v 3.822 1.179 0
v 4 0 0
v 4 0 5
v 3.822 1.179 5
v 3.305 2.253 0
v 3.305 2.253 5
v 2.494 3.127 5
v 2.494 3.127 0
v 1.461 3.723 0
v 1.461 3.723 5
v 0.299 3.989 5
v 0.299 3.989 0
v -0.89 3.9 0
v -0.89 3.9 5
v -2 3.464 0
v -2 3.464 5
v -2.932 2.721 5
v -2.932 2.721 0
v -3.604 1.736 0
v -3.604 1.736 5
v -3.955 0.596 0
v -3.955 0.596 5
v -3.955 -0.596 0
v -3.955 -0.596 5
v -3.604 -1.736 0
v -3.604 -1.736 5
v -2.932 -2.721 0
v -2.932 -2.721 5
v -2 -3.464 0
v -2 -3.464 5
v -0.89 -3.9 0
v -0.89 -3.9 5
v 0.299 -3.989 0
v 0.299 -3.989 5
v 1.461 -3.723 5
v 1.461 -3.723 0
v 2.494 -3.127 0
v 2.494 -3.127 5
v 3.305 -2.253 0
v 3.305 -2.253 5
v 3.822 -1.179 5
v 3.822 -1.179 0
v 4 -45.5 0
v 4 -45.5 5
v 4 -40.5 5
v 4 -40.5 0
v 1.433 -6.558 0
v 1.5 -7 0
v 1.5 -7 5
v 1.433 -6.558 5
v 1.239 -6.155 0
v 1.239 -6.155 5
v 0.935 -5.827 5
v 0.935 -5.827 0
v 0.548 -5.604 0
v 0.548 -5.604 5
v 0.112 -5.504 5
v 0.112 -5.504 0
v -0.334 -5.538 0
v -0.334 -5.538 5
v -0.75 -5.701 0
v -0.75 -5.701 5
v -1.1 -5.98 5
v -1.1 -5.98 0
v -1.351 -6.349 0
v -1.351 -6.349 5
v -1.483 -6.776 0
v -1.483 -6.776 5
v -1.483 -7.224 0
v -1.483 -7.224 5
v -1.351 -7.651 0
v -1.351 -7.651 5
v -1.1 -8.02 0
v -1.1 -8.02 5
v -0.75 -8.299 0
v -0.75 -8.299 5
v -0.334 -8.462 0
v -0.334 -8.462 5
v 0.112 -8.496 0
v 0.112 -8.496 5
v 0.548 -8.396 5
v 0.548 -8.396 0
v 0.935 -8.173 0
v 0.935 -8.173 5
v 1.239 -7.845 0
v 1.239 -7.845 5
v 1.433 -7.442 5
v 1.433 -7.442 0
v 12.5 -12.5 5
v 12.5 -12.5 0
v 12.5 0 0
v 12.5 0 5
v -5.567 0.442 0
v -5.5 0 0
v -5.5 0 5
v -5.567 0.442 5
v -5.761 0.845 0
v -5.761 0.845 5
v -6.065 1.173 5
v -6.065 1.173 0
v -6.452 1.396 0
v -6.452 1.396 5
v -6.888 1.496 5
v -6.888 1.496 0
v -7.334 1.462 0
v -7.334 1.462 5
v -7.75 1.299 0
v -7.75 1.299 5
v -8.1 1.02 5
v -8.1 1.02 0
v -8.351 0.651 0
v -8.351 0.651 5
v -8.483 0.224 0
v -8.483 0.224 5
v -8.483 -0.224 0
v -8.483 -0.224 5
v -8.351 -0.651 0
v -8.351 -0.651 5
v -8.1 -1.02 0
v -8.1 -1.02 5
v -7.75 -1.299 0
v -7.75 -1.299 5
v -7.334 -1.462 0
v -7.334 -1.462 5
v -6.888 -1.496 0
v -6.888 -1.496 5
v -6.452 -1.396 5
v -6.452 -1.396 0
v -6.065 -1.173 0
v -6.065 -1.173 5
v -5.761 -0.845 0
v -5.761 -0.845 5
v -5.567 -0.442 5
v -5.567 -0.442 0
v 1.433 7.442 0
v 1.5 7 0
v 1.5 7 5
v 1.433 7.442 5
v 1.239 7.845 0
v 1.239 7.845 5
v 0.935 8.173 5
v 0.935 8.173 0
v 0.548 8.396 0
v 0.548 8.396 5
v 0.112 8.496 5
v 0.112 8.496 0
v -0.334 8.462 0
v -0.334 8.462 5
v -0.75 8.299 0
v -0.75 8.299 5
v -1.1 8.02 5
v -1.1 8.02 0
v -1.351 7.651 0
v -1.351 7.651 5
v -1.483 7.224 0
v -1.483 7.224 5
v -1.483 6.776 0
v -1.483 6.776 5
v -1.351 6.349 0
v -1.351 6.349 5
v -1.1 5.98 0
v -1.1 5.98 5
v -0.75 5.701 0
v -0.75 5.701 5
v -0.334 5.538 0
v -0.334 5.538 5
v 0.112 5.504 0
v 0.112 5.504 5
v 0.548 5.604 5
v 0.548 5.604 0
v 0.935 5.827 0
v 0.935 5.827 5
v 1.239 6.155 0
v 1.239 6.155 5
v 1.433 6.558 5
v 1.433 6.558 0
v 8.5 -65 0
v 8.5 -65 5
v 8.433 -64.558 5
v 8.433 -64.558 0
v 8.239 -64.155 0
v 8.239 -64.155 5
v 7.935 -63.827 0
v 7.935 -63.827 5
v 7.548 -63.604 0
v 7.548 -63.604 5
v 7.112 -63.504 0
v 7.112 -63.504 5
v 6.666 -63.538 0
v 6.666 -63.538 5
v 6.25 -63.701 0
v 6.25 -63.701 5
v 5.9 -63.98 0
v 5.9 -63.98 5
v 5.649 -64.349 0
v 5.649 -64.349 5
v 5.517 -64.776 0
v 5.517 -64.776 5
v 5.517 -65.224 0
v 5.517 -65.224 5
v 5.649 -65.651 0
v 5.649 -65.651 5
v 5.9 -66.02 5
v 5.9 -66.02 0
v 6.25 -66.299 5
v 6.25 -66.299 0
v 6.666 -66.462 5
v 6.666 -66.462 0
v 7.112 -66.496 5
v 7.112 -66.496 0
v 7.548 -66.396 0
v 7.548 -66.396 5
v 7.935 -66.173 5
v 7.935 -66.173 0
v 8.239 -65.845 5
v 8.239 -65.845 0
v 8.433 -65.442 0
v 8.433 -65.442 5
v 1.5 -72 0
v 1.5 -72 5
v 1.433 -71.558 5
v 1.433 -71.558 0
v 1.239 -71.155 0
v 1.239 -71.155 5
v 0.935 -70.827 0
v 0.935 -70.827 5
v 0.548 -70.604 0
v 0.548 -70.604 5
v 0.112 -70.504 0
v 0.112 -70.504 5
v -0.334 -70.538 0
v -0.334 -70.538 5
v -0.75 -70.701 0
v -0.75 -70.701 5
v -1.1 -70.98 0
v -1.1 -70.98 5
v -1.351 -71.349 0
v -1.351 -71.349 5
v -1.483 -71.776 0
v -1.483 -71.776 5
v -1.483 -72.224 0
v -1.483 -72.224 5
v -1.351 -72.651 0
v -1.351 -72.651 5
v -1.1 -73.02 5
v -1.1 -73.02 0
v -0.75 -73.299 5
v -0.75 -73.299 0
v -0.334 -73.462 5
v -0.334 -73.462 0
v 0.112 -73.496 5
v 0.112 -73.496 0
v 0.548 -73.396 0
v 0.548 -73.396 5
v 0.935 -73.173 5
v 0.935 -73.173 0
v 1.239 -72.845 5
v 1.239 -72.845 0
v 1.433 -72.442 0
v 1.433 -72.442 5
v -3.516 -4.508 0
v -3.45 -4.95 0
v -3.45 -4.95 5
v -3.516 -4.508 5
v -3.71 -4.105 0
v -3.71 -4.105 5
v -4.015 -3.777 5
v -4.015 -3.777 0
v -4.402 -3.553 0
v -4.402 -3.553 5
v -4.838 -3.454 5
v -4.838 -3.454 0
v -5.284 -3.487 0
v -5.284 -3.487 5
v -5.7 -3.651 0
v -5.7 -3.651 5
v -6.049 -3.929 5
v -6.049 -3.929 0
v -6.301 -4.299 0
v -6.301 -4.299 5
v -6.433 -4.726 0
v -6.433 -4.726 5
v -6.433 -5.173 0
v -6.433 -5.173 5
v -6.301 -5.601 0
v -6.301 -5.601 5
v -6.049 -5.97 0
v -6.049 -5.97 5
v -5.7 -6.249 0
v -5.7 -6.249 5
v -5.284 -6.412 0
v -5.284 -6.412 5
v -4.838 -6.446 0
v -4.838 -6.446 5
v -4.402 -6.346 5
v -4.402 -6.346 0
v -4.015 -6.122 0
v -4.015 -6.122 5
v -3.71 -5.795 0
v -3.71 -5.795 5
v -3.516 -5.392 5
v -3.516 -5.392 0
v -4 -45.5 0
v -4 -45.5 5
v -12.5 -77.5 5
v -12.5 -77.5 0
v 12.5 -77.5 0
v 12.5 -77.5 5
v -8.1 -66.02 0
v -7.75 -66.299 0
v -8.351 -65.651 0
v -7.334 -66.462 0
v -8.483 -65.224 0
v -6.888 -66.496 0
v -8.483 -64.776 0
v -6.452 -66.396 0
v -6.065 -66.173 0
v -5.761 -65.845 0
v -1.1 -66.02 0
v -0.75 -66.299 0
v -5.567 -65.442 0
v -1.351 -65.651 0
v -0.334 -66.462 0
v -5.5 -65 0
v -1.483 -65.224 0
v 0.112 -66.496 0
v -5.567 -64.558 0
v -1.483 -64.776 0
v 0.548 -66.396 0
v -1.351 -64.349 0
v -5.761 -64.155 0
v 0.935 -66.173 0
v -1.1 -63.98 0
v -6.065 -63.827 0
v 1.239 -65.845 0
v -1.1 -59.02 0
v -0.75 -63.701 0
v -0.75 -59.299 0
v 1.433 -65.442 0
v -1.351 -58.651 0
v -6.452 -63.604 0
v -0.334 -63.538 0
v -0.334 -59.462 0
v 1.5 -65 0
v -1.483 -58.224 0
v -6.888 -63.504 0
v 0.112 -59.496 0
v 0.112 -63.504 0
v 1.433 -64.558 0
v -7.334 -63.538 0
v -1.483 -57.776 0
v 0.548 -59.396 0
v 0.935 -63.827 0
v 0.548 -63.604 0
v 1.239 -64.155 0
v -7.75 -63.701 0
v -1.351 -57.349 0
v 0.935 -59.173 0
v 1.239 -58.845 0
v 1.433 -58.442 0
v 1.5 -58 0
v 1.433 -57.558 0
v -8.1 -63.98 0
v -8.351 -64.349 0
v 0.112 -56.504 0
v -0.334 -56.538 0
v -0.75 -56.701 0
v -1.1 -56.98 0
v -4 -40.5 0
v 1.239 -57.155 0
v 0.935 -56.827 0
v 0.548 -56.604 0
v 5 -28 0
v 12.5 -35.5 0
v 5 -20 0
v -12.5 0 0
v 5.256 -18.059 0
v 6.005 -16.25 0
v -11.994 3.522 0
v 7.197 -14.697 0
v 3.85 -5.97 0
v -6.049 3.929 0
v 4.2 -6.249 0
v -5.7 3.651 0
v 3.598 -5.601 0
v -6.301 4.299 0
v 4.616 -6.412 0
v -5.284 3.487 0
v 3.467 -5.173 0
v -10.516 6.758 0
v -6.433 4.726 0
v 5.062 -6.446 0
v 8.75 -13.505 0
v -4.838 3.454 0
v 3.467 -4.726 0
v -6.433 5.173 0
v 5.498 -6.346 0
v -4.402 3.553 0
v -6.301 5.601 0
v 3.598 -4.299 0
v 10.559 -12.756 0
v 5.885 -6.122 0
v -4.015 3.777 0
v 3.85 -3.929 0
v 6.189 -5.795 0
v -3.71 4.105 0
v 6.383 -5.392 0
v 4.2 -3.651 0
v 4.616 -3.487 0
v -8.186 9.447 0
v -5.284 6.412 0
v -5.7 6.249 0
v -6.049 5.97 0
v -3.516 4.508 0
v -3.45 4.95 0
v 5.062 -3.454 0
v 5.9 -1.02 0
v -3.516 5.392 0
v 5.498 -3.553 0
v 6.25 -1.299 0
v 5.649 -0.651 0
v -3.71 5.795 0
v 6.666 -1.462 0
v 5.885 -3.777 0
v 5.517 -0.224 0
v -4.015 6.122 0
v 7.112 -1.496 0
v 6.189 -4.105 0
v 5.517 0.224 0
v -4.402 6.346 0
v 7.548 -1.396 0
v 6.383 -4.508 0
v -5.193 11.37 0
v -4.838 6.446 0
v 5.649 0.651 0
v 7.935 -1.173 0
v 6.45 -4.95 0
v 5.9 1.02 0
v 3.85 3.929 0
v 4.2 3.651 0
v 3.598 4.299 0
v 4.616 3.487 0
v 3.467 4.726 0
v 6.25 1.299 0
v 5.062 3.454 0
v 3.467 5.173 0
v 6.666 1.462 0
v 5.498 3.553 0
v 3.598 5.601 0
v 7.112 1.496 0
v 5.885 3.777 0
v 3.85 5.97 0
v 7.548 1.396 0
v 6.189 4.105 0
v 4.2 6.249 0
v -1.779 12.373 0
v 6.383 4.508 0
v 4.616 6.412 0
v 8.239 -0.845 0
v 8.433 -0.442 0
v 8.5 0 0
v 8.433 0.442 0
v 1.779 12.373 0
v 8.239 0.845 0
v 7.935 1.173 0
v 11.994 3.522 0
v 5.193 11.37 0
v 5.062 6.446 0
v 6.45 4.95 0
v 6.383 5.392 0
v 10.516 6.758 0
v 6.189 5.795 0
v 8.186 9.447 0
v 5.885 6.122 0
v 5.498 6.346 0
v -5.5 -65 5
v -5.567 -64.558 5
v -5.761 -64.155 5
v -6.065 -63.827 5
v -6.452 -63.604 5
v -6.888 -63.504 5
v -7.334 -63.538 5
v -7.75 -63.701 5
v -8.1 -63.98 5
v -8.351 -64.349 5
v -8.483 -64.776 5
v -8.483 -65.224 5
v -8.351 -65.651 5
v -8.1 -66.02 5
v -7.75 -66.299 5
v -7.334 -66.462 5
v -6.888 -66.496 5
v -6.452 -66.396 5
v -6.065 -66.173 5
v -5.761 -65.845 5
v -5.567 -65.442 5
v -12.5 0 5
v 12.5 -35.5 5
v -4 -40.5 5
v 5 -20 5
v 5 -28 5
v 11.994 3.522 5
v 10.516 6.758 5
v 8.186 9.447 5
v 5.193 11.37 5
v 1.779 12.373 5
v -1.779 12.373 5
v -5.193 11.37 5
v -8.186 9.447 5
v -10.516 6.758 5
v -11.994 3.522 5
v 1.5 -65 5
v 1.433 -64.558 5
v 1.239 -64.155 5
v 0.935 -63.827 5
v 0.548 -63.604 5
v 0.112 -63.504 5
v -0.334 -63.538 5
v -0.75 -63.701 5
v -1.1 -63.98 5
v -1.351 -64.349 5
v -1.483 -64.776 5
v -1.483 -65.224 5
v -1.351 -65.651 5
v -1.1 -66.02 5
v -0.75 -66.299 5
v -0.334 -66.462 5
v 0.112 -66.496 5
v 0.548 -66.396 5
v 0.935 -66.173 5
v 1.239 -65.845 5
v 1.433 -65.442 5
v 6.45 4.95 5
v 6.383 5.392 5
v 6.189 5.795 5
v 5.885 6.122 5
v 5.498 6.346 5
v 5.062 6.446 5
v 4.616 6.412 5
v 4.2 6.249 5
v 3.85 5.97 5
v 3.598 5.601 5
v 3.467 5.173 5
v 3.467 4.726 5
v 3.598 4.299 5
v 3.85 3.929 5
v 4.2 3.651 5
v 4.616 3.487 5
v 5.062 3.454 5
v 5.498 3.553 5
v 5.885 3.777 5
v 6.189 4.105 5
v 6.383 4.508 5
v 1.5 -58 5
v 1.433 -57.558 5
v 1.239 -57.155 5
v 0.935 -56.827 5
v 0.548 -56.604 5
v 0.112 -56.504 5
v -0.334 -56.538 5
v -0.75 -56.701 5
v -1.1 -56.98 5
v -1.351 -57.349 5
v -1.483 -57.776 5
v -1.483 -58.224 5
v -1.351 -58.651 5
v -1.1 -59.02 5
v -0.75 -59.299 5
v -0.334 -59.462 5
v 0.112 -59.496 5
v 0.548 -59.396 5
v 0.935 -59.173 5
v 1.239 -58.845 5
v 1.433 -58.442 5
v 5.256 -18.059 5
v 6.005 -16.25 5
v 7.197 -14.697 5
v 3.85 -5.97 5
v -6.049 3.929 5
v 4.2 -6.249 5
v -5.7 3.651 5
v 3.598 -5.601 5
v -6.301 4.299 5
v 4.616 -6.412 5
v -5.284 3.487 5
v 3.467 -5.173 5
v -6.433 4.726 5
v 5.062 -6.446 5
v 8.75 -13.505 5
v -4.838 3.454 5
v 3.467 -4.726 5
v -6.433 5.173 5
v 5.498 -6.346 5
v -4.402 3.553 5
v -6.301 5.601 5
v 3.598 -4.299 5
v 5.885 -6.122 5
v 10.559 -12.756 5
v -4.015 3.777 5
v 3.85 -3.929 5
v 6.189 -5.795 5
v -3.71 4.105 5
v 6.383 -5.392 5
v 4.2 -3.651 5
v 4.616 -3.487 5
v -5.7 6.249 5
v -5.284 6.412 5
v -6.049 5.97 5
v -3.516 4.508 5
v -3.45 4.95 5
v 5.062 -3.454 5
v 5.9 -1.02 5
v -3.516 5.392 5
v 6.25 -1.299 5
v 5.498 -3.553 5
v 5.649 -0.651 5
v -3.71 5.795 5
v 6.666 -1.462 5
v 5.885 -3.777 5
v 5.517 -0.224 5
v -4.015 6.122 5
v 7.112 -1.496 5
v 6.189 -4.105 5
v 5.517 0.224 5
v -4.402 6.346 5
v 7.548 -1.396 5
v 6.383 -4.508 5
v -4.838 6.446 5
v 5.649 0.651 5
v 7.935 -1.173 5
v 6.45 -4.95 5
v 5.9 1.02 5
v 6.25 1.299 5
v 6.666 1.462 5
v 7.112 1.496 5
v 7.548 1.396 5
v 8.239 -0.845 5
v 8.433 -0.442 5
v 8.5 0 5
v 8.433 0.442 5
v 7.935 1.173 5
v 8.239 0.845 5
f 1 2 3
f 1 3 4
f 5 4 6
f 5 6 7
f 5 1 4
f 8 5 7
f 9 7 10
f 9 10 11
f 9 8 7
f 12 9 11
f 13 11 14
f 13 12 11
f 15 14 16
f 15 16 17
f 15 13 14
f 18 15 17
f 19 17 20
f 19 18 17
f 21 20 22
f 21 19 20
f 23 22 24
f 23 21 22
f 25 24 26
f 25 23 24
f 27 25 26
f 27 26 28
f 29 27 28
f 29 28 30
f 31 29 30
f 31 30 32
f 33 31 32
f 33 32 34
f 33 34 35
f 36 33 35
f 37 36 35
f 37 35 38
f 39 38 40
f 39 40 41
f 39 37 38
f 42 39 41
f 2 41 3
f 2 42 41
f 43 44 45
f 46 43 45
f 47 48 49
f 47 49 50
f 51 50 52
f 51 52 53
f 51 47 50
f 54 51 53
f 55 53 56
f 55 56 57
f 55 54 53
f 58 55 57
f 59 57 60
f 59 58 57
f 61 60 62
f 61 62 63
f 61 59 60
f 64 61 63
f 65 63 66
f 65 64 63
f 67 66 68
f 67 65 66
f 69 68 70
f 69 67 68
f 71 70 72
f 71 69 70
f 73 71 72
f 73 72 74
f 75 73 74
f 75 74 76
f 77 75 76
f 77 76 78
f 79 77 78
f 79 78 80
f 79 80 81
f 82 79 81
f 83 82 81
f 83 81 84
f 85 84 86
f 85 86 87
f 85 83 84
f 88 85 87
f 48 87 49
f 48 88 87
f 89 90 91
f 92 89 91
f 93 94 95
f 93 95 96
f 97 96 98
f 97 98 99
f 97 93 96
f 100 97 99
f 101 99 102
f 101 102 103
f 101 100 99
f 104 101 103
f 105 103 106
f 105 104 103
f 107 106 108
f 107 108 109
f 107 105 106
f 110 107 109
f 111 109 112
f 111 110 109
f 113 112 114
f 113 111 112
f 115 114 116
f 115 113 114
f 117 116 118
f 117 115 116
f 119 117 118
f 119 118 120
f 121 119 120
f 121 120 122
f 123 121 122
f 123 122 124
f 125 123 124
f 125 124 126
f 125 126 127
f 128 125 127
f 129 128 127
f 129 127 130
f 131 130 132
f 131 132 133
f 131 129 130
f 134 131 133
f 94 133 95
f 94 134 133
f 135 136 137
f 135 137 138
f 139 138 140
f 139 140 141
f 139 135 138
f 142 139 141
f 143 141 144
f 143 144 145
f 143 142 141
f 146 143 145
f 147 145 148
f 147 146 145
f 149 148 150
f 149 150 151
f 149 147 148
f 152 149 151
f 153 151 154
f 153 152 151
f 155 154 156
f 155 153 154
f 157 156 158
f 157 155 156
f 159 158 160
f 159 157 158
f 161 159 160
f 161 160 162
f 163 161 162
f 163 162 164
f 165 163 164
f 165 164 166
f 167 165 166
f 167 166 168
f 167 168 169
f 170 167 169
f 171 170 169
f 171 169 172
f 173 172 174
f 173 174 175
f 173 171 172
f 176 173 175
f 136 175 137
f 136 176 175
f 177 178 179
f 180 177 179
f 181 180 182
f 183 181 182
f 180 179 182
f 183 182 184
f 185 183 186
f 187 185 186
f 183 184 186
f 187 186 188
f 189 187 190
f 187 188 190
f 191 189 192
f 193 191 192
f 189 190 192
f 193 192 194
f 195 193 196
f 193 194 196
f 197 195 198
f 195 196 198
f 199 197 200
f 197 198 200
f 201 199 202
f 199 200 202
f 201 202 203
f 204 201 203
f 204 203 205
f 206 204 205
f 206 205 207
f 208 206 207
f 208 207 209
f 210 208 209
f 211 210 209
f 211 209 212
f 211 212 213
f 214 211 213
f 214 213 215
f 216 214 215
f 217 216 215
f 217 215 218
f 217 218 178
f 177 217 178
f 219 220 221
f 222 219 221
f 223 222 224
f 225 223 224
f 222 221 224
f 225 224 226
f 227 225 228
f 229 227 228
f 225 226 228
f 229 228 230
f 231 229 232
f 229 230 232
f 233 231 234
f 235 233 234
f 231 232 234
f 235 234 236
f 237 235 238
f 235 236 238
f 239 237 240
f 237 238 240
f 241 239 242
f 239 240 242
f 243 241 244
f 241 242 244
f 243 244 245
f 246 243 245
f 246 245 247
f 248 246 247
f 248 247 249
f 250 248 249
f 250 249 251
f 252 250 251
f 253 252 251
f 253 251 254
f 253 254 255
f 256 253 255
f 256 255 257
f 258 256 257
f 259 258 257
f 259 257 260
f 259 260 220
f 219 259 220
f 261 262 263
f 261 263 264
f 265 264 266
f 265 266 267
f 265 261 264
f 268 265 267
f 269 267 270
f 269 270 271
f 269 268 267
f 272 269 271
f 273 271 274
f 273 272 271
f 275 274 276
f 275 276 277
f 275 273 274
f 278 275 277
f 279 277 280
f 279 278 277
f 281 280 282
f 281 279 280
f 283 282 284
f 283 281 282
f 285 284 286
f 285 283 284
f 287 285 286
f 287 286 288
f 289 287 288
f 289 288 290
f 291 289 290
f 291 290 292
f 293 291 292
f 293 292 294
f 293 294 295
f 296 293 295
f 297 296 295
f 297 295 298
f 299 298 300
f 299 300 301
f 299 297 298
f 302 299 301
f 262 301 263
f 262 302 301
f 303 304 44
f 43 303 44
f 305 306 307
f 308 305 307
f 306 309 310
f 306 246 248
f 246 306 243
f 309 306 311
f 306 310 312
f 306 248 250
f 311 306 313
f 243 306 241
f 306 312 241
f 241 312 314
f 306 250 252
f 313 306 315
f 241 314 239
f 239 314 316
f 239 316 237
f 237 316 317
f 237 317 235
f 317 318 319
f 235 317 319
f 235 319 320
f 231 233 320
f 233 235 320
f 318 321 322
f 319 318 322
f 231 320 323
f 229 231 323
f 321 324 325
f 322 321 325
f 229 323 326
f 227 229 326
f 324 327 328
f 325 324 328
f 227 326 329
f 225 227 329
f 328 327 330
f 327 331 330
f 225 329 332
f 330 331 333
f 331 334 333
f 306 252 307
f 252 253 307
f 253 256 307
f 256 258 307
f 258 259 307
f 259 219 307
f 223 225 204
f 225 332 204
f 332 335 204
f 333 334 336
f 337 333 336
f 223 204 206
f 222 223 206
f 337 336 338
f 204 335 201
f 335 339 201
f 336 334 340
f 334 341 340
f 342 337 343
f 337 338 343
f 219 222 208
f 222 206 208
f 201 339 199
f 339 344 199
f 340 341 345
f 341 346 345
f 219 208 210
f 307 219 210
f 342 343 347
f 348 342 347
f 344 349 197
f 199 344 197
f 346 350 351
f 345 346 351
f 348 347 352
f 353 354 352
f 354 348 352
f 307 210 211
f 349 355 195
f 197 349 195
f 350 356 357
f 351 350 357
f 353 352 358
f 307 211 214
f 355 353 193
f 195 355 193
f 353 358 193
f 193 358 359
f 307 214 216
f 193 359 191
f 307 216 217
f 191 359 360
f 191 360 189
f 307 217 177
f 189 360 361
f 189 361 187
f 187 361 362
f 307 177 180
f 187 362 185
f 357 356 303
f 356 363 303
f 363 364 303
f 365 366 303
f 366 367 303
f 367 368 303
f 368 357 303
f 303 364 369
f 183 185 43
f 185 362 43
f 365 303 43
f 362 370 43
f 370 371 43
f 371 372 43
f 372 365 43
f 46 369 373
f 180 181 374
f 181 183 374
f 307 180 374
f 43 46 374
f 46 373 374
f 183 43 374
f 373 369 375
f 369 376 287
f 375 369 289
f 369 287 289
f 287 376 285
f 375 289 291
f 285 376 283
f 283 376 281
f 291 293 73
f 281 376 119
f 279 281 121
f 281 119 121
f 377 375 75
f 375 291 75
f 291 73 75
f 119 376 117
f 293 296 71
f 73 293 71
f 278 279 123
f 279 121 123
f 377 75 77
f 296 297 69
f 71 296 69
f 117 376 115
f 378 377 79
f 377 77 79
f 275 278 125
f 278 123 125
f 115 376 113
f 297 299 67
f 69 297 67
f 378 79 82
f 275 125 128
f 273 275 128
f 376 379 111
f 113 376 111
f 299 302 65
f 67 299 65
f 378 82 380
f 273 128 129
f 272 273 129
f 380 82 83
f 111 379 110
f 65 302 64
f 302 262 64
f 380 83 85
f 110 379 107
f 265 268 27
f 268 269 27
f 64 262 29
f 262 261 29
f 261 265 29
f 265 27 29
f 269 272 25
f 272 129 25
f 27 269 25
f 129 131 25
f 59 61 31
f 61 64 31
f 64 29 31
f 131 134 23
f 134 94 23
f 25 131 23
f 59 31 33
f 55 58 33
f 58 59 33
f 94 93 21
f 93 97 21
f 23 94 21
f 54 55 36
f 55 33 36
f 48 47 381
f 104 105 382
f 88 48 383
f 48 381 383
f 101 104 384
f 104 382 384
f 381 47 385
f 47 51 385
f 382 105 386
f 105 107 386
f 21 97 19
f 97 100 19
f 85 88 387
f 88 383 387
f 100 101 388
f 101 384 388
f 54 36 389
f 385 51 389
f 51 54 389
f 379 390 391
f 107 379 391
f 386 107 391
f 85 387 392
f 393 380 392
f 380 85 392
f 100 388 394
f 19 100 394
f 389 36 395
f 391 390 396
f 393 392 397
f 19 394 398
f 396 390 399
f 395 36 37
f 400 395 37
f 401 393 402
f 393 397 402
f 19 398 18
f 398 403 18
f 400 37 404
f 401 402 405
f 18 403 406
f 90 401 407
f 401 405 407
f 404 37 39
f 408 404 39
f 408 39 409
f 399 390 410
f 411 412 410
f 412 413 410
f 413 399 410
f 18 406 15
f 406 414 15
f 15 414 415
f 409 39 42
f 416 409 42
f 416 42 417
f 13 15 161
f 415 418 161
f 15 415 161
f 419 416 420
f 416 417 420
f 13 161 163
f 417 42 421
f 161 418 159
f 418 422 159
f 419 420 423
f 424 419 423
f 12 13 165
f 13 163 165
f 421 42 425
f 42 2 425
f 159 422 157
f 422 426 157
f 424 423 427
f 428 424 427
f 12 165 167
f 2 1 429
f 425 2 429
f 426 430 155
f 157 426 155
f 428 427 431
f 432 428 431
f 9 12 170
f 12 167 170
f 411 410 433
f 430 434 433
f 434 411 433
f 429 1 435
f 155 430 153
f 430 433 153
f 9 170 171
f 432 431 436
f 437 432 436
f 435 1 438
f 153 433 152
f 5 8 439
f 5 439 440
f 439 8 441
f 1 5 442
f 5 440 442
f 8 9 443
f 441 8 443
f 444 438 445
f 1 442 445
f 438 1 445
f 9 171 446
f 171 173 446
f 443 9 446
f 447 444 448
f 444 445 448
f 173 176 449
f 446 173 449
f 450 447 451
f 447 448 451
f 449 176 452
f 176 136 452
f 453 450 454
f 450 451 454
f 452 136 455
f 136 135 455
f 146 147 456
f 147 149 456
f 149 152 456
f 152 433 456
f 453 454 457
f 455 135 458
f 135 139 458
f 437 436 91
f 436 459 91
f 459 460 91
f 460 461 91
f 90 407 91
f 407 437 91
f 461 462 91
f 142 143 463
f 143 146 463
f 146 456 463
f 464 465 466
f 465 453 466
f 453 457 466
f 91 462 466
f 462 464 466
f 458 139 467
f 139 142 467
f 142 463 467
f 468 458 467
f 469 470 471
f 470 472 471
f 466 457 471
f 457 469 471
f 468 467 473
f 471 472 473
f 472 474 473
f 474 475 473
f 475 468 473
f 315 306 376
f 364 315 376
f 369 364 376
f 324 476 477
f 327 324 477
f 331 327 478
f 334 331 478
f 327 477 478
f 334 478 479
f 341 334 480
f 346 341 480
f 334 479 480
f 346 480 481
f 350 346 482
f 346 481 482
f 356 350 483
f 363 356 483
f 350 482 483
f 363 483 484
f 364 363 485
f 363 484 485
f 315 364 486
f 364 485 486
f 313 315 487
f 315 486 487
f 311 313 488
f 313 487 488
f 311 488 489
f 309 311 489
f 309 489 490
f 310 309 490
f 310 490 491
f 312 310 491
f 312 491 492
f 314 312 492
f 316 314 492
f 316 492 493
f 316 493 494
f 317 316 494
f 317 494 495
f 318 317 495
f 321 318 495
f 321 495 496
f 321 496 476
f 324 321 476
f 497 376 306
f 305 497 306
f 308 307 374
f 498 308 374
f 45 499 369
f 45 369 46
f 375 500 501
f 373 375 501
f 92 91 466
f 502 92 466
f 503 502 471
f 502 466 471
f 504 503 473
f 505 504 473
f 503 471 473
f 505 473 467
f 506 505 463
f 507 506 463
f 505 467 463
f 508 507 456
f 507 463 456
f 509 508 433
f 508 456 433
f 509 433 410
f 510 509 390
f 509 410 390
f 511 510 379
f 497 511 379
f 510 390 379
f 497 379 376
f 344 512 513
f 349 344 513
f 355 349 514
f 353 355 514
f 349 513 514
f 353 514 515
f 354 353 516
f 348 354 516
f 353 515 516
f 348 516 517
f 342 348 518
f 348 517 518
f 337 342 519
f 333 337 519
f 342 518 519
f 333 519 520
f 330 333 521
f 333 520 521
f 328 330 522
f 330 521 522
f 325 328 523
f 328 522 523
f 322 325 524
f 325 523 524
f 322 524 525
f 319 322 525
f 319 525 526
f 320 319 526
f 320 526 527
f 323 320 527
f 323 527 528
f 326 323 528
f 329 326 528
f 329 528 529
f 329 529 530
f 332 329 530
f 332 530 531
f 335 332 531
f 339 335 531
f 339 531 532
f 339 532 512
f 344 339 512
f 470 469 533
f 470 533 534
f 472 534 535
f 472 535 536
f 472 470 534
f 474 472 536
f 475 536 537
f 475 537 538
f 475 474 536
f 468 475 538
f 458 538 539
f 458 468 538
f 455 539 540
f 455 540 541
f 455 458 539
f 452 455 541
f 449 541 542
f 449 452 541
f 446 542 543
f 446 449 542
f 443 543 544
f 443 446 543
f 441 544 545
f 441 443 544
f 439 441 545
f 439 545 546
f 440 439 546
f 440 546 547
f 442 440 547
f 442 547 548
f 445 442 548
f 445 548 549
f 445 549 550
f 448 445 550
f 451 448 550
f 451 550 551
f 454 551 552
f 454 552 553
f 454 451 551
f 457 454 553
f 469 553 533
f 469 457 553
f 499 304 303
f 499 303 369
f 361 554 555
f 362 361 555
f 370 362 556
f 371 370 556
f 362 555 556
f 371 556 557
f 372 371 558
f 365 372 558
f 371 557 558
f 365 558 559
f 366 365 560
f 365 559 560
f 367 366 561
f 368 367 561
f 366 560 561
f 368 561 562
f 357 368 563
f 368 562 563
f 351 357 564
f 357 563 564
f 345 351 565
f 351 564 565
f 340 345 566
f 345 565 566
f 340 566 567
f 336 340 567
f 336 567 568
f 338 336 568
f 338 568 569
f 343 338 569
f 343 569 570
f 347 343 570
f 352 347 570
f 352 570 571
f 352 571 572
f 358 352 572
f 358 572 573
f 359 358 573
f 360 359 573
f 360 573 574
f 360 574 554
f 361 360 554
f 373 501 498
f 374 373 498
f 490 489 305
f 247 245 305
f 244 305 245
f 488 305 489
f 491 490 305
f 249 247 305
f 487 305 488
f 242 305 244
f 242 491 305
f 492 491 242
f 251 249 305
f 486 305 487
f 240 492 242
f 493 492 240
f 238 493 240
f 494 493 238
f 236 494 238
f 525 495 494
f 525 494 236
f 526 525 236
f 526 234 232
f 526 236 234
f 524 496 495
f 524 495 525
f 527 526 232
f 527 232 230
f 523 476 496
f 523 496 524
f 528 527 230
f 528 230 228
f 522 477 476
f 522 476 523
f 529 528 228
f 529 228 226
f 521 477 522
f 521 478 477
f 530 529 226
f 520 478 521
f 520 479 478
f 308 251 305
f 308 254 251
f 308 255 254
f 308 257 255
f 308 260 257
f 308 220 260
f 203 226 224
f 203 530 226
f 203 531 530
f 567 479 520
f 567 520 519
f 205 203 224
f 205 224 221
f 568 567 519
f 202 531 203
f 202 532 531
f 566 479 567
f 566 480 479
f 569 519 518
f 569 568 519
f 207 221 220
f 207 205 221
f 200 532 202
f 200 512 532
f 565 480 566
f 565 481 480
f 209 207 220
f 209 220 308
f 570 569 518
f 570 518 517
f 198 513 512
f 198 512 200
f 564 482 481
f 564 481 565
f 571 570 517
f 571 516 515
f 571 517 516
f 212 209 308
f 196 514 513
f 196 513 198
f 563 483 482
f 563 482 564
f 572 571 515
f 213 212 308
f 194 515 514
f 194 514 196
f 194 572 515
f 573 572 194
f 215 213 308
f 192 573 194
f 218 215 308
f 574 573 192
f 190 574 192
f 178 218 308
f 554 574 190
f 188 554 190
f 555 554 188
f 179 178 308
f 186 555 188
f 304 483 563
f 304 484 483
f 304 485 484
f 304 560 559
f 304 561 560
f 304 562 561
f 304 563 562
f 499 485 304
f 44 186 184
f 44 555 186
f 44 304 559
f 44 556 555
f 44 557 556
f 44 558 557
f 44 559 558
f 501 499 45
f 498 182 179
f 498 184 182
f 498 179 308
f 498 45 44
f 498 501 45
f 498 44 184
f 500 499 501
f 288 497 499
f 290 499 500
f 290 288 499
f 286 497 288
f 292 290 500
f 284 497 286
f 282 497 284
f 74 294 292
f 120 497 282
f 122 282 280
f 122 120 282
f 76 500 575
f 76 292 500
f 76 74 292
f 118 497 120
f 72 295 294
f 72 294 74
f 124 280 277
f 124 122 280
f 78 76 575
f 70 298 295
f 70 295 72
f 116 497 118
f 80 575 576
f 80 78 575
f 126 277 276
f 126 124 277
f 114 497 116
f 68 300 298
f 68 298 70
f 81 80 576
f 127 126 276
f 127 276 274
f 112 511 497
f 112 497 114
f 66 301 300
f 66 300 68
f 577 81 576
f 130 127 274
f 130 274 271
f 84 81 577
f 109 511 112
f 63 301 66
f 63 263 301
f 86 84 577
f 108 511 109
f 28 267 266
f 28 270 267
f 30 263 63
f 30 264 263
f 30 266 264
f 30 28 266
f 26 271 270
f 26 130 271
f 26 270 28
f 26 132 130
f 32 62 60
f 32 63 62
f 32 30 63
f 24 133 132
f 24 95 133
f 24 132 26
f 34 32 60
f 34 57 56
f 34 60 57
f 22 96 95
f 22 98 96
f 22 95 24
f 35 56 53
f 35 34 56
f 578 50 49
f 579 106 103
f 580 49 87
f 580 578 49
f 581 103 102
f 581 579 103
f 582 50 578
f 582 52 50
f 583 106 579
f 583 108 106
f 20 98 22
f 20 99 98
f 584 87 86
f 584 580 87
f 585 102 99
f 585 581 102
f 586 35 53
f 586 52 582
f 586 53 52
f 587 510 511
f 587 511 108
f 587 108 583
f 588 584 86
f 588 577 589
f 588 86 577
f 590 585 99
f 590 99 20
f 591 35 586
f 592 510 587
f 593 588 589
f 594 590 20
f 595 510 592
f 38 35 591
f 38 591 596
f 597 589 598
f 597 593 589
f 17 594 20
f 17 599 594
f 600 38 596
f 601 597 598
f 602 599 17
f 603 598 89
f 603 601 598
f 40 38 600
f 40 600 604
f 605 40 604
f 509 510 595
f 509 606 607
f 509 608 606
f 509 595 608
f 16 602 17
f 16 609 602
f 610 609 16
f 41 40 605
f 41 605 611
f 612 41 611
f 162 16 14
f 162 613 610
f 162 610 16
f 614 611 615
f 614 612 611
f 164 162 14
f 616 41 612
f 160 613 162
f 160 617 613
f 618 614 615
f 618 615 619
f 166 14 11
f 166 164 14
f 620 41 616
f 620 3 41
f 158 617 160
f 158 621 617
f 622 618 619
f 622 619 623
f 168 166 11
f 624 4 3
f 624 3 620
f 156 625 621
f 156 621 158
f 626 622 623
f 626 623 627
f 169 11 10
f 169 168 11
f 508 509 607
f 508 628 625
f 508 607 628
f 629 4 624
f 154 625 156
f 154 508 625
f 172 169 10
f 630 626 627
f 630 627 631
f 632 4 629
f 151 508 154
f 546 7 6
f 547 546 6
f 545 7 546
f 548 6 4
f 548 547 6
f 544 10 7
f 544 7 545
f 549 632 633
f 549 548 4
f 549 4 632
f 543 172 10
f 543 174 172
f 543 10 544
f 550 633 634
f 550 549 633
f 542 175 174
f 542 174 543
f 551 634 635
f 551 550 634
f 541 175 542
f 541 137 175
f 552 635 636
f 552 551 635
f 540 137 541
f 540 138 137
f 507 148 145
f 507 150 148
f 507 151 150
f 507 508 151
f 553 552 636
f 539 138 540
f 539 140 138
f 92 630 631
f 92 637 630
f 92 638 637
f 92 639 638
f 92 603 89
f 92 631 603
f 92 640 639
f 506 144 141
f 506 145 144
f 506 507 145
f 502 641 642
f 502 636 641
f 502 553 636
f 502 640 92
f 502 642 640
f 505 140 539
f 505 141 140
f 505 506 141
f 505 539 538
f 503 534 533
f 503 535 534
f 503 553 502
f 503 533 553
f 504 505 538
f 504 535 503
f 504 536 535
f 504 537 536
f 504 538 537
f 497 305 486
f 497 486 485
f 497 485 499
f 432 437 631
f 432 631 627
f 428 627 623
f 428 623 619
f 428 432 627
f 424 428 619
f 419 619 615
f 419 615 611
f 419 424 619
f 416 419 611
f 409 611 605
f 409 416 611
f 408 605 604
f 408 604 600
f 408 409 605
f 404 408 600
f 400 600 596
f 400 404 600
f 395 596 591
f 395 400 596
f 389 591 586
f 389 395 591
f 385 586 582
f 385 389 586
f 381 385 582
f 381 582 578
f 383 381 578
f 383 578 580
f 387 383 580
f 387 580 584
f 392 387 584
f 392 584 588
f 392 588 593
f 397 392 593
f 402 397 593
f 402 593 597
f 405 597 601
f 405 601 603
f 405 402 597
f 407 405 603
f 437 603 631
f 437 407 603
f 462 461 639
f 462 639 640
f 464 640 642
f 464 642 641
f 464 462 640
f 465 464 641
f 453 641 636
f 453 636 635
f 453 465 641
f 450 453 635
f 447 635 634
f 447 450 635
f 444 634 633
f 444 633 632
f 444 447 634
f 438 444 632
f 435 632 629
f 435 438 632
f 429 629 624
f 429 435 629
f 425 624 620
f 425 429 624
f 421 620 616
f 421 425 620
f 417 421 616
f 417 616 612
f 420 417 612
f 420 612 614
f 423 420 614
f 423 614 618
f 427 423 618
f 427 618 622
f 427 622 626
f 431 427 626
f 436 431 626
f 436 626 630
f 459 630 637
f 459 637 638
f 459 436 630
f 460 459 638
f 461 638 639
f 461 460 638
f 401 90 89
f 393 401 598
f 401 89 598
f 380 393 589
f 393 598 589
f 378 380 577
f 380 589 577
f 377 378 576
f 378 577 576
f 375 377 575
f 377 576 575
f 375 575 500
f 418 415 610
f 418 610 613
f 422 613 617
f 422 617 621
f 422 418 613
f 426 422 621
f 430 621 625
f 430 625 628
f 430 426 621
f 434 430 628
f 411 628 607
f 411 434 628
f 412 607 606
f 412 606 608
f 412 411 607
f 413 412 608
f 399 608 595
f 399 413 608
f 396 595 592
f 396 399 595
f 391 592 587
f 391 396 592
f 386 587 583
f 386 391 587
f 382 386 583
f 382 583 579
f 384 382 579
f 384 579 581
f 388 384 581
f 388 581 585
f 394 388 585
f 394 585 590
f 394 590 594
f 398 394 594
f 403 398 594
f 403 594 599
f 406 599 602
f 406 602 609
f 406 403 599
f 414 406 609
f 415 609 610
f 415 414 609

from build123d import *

# Parameters (mm, degrees)
SKETCH1_R           = 4
SKETCH1_R_2         = 1.5
BOSS_EXTRUDE1_DEPTH = 5
SKETCH2_W           = 8
SKETCH2_H           = 5
CUT_EXTRUDE1_DEPTH  = 10
SKETCH3_R           = 1.5
CUT_EXTRUDE2_DEPTH  = 10
CUT_EXTRUDE3_DEPTH  = 10


with BuildPart() as part:
    # Sketch1 → Boss-Extrude1 (new body)
    with BuildSketch(Plane.XY):
        with BuildLine():
            Line((-12.5, 0), (-12.5, -77.5))
            Line((-12.5, -77.5), (12.5, -77.5))
            Line((12.5, -77.5), (12.5, 0))
            ThreePointArc((12.5, 0), (0, 12.5), (-12.5, 0))
        make_face()
        Circle(SKETCH1_R, mode=Mode.SUBTRACT)
        with Locations((0, 7)):
            Circle(SKETCH1_R_2, mode=Mode.SUBTRACT)
        with Locations((4.949747468, 4.949747468)):
            Circle(SKETCH1_R_2, mode=Mode.SUBTRACT)
        with Locations((7, 0)):
            Circle(SKETCH1_R_2, mode=Mode.SUBTRACT)
        with Locations((4.949747468, -4.949747468)):
            Circle(SKETCH1_R_2, mode=Mode.SUBTRACT)
        with Locations((0, -7)):
            Circle(SKETCH1_R_2, mode=Mode.SUBTRACT)
        with Locations((-4.949747468, -4.949747468)):
            Circle(SKETCH1_R_2, mode=Mode.SUBTRACT)
        with Locations((-7, 0)):
            Circle(SKETCH1_R_2, mode=Mode.SUBTRACT)
        with Locations((-4.949747468, 4.949747468)):
            Circle(SKETCH1_R_2, mode=Mode.SUBTRACT)
    extrude(amount=BOSS_EXTRUDE1_DEPTH)

    # Sketch2 → Cut-Extrude1 (cut)
    with BuildSketch(Plane.XY.offset(5)):
        with Locations((0, -43)):
            Rectangle(SKETCH2_W, SKETCH2_H)
    extrude(amount=-CUT_EXTRUDE1_DEPTH, mode=Mode.SUBTRACT)

    # Sketch3 → Cut-Extrude2 (cut)
    with BuildSketch(Plane.XY.offset(5)):
        with Locations((0, -65)):
            Circle(SKETCH3_R)
        with Locations((0, -58)):
            Circle(SKETCH3_R)
        with Locations((-7, -65)):
            Circle(SKETCH3_R)
        with Locations((7, -65)):
            Circle(SKETCH3_R)
        with Locations((0, -72)):
            Circle(SKETCH3_R)
    extrude(amount=-CUT_EXTRUDE2_DEPTH, mode=Mode.SUBTRACT)

    # Sketch4 → Cut-Extrude3 (cut)
    with BuildSketch(Plane.XY.offset(5)):
        with BuildLine():
            Line((5, -20), (5, -28))
            Line((5, -28), (12.5, -35.5))
            Line((12.5, -35.5), (12.5, -27.5))
            ThreePointArc((12.5, -27.5), (17.803300859, -14.696699141), (5, -20))
        make_face()
    extrude(amount=-CUT_EXTRUDE3_DEPTH, mode=Mode.SUBTRACT)


solid = part.part
